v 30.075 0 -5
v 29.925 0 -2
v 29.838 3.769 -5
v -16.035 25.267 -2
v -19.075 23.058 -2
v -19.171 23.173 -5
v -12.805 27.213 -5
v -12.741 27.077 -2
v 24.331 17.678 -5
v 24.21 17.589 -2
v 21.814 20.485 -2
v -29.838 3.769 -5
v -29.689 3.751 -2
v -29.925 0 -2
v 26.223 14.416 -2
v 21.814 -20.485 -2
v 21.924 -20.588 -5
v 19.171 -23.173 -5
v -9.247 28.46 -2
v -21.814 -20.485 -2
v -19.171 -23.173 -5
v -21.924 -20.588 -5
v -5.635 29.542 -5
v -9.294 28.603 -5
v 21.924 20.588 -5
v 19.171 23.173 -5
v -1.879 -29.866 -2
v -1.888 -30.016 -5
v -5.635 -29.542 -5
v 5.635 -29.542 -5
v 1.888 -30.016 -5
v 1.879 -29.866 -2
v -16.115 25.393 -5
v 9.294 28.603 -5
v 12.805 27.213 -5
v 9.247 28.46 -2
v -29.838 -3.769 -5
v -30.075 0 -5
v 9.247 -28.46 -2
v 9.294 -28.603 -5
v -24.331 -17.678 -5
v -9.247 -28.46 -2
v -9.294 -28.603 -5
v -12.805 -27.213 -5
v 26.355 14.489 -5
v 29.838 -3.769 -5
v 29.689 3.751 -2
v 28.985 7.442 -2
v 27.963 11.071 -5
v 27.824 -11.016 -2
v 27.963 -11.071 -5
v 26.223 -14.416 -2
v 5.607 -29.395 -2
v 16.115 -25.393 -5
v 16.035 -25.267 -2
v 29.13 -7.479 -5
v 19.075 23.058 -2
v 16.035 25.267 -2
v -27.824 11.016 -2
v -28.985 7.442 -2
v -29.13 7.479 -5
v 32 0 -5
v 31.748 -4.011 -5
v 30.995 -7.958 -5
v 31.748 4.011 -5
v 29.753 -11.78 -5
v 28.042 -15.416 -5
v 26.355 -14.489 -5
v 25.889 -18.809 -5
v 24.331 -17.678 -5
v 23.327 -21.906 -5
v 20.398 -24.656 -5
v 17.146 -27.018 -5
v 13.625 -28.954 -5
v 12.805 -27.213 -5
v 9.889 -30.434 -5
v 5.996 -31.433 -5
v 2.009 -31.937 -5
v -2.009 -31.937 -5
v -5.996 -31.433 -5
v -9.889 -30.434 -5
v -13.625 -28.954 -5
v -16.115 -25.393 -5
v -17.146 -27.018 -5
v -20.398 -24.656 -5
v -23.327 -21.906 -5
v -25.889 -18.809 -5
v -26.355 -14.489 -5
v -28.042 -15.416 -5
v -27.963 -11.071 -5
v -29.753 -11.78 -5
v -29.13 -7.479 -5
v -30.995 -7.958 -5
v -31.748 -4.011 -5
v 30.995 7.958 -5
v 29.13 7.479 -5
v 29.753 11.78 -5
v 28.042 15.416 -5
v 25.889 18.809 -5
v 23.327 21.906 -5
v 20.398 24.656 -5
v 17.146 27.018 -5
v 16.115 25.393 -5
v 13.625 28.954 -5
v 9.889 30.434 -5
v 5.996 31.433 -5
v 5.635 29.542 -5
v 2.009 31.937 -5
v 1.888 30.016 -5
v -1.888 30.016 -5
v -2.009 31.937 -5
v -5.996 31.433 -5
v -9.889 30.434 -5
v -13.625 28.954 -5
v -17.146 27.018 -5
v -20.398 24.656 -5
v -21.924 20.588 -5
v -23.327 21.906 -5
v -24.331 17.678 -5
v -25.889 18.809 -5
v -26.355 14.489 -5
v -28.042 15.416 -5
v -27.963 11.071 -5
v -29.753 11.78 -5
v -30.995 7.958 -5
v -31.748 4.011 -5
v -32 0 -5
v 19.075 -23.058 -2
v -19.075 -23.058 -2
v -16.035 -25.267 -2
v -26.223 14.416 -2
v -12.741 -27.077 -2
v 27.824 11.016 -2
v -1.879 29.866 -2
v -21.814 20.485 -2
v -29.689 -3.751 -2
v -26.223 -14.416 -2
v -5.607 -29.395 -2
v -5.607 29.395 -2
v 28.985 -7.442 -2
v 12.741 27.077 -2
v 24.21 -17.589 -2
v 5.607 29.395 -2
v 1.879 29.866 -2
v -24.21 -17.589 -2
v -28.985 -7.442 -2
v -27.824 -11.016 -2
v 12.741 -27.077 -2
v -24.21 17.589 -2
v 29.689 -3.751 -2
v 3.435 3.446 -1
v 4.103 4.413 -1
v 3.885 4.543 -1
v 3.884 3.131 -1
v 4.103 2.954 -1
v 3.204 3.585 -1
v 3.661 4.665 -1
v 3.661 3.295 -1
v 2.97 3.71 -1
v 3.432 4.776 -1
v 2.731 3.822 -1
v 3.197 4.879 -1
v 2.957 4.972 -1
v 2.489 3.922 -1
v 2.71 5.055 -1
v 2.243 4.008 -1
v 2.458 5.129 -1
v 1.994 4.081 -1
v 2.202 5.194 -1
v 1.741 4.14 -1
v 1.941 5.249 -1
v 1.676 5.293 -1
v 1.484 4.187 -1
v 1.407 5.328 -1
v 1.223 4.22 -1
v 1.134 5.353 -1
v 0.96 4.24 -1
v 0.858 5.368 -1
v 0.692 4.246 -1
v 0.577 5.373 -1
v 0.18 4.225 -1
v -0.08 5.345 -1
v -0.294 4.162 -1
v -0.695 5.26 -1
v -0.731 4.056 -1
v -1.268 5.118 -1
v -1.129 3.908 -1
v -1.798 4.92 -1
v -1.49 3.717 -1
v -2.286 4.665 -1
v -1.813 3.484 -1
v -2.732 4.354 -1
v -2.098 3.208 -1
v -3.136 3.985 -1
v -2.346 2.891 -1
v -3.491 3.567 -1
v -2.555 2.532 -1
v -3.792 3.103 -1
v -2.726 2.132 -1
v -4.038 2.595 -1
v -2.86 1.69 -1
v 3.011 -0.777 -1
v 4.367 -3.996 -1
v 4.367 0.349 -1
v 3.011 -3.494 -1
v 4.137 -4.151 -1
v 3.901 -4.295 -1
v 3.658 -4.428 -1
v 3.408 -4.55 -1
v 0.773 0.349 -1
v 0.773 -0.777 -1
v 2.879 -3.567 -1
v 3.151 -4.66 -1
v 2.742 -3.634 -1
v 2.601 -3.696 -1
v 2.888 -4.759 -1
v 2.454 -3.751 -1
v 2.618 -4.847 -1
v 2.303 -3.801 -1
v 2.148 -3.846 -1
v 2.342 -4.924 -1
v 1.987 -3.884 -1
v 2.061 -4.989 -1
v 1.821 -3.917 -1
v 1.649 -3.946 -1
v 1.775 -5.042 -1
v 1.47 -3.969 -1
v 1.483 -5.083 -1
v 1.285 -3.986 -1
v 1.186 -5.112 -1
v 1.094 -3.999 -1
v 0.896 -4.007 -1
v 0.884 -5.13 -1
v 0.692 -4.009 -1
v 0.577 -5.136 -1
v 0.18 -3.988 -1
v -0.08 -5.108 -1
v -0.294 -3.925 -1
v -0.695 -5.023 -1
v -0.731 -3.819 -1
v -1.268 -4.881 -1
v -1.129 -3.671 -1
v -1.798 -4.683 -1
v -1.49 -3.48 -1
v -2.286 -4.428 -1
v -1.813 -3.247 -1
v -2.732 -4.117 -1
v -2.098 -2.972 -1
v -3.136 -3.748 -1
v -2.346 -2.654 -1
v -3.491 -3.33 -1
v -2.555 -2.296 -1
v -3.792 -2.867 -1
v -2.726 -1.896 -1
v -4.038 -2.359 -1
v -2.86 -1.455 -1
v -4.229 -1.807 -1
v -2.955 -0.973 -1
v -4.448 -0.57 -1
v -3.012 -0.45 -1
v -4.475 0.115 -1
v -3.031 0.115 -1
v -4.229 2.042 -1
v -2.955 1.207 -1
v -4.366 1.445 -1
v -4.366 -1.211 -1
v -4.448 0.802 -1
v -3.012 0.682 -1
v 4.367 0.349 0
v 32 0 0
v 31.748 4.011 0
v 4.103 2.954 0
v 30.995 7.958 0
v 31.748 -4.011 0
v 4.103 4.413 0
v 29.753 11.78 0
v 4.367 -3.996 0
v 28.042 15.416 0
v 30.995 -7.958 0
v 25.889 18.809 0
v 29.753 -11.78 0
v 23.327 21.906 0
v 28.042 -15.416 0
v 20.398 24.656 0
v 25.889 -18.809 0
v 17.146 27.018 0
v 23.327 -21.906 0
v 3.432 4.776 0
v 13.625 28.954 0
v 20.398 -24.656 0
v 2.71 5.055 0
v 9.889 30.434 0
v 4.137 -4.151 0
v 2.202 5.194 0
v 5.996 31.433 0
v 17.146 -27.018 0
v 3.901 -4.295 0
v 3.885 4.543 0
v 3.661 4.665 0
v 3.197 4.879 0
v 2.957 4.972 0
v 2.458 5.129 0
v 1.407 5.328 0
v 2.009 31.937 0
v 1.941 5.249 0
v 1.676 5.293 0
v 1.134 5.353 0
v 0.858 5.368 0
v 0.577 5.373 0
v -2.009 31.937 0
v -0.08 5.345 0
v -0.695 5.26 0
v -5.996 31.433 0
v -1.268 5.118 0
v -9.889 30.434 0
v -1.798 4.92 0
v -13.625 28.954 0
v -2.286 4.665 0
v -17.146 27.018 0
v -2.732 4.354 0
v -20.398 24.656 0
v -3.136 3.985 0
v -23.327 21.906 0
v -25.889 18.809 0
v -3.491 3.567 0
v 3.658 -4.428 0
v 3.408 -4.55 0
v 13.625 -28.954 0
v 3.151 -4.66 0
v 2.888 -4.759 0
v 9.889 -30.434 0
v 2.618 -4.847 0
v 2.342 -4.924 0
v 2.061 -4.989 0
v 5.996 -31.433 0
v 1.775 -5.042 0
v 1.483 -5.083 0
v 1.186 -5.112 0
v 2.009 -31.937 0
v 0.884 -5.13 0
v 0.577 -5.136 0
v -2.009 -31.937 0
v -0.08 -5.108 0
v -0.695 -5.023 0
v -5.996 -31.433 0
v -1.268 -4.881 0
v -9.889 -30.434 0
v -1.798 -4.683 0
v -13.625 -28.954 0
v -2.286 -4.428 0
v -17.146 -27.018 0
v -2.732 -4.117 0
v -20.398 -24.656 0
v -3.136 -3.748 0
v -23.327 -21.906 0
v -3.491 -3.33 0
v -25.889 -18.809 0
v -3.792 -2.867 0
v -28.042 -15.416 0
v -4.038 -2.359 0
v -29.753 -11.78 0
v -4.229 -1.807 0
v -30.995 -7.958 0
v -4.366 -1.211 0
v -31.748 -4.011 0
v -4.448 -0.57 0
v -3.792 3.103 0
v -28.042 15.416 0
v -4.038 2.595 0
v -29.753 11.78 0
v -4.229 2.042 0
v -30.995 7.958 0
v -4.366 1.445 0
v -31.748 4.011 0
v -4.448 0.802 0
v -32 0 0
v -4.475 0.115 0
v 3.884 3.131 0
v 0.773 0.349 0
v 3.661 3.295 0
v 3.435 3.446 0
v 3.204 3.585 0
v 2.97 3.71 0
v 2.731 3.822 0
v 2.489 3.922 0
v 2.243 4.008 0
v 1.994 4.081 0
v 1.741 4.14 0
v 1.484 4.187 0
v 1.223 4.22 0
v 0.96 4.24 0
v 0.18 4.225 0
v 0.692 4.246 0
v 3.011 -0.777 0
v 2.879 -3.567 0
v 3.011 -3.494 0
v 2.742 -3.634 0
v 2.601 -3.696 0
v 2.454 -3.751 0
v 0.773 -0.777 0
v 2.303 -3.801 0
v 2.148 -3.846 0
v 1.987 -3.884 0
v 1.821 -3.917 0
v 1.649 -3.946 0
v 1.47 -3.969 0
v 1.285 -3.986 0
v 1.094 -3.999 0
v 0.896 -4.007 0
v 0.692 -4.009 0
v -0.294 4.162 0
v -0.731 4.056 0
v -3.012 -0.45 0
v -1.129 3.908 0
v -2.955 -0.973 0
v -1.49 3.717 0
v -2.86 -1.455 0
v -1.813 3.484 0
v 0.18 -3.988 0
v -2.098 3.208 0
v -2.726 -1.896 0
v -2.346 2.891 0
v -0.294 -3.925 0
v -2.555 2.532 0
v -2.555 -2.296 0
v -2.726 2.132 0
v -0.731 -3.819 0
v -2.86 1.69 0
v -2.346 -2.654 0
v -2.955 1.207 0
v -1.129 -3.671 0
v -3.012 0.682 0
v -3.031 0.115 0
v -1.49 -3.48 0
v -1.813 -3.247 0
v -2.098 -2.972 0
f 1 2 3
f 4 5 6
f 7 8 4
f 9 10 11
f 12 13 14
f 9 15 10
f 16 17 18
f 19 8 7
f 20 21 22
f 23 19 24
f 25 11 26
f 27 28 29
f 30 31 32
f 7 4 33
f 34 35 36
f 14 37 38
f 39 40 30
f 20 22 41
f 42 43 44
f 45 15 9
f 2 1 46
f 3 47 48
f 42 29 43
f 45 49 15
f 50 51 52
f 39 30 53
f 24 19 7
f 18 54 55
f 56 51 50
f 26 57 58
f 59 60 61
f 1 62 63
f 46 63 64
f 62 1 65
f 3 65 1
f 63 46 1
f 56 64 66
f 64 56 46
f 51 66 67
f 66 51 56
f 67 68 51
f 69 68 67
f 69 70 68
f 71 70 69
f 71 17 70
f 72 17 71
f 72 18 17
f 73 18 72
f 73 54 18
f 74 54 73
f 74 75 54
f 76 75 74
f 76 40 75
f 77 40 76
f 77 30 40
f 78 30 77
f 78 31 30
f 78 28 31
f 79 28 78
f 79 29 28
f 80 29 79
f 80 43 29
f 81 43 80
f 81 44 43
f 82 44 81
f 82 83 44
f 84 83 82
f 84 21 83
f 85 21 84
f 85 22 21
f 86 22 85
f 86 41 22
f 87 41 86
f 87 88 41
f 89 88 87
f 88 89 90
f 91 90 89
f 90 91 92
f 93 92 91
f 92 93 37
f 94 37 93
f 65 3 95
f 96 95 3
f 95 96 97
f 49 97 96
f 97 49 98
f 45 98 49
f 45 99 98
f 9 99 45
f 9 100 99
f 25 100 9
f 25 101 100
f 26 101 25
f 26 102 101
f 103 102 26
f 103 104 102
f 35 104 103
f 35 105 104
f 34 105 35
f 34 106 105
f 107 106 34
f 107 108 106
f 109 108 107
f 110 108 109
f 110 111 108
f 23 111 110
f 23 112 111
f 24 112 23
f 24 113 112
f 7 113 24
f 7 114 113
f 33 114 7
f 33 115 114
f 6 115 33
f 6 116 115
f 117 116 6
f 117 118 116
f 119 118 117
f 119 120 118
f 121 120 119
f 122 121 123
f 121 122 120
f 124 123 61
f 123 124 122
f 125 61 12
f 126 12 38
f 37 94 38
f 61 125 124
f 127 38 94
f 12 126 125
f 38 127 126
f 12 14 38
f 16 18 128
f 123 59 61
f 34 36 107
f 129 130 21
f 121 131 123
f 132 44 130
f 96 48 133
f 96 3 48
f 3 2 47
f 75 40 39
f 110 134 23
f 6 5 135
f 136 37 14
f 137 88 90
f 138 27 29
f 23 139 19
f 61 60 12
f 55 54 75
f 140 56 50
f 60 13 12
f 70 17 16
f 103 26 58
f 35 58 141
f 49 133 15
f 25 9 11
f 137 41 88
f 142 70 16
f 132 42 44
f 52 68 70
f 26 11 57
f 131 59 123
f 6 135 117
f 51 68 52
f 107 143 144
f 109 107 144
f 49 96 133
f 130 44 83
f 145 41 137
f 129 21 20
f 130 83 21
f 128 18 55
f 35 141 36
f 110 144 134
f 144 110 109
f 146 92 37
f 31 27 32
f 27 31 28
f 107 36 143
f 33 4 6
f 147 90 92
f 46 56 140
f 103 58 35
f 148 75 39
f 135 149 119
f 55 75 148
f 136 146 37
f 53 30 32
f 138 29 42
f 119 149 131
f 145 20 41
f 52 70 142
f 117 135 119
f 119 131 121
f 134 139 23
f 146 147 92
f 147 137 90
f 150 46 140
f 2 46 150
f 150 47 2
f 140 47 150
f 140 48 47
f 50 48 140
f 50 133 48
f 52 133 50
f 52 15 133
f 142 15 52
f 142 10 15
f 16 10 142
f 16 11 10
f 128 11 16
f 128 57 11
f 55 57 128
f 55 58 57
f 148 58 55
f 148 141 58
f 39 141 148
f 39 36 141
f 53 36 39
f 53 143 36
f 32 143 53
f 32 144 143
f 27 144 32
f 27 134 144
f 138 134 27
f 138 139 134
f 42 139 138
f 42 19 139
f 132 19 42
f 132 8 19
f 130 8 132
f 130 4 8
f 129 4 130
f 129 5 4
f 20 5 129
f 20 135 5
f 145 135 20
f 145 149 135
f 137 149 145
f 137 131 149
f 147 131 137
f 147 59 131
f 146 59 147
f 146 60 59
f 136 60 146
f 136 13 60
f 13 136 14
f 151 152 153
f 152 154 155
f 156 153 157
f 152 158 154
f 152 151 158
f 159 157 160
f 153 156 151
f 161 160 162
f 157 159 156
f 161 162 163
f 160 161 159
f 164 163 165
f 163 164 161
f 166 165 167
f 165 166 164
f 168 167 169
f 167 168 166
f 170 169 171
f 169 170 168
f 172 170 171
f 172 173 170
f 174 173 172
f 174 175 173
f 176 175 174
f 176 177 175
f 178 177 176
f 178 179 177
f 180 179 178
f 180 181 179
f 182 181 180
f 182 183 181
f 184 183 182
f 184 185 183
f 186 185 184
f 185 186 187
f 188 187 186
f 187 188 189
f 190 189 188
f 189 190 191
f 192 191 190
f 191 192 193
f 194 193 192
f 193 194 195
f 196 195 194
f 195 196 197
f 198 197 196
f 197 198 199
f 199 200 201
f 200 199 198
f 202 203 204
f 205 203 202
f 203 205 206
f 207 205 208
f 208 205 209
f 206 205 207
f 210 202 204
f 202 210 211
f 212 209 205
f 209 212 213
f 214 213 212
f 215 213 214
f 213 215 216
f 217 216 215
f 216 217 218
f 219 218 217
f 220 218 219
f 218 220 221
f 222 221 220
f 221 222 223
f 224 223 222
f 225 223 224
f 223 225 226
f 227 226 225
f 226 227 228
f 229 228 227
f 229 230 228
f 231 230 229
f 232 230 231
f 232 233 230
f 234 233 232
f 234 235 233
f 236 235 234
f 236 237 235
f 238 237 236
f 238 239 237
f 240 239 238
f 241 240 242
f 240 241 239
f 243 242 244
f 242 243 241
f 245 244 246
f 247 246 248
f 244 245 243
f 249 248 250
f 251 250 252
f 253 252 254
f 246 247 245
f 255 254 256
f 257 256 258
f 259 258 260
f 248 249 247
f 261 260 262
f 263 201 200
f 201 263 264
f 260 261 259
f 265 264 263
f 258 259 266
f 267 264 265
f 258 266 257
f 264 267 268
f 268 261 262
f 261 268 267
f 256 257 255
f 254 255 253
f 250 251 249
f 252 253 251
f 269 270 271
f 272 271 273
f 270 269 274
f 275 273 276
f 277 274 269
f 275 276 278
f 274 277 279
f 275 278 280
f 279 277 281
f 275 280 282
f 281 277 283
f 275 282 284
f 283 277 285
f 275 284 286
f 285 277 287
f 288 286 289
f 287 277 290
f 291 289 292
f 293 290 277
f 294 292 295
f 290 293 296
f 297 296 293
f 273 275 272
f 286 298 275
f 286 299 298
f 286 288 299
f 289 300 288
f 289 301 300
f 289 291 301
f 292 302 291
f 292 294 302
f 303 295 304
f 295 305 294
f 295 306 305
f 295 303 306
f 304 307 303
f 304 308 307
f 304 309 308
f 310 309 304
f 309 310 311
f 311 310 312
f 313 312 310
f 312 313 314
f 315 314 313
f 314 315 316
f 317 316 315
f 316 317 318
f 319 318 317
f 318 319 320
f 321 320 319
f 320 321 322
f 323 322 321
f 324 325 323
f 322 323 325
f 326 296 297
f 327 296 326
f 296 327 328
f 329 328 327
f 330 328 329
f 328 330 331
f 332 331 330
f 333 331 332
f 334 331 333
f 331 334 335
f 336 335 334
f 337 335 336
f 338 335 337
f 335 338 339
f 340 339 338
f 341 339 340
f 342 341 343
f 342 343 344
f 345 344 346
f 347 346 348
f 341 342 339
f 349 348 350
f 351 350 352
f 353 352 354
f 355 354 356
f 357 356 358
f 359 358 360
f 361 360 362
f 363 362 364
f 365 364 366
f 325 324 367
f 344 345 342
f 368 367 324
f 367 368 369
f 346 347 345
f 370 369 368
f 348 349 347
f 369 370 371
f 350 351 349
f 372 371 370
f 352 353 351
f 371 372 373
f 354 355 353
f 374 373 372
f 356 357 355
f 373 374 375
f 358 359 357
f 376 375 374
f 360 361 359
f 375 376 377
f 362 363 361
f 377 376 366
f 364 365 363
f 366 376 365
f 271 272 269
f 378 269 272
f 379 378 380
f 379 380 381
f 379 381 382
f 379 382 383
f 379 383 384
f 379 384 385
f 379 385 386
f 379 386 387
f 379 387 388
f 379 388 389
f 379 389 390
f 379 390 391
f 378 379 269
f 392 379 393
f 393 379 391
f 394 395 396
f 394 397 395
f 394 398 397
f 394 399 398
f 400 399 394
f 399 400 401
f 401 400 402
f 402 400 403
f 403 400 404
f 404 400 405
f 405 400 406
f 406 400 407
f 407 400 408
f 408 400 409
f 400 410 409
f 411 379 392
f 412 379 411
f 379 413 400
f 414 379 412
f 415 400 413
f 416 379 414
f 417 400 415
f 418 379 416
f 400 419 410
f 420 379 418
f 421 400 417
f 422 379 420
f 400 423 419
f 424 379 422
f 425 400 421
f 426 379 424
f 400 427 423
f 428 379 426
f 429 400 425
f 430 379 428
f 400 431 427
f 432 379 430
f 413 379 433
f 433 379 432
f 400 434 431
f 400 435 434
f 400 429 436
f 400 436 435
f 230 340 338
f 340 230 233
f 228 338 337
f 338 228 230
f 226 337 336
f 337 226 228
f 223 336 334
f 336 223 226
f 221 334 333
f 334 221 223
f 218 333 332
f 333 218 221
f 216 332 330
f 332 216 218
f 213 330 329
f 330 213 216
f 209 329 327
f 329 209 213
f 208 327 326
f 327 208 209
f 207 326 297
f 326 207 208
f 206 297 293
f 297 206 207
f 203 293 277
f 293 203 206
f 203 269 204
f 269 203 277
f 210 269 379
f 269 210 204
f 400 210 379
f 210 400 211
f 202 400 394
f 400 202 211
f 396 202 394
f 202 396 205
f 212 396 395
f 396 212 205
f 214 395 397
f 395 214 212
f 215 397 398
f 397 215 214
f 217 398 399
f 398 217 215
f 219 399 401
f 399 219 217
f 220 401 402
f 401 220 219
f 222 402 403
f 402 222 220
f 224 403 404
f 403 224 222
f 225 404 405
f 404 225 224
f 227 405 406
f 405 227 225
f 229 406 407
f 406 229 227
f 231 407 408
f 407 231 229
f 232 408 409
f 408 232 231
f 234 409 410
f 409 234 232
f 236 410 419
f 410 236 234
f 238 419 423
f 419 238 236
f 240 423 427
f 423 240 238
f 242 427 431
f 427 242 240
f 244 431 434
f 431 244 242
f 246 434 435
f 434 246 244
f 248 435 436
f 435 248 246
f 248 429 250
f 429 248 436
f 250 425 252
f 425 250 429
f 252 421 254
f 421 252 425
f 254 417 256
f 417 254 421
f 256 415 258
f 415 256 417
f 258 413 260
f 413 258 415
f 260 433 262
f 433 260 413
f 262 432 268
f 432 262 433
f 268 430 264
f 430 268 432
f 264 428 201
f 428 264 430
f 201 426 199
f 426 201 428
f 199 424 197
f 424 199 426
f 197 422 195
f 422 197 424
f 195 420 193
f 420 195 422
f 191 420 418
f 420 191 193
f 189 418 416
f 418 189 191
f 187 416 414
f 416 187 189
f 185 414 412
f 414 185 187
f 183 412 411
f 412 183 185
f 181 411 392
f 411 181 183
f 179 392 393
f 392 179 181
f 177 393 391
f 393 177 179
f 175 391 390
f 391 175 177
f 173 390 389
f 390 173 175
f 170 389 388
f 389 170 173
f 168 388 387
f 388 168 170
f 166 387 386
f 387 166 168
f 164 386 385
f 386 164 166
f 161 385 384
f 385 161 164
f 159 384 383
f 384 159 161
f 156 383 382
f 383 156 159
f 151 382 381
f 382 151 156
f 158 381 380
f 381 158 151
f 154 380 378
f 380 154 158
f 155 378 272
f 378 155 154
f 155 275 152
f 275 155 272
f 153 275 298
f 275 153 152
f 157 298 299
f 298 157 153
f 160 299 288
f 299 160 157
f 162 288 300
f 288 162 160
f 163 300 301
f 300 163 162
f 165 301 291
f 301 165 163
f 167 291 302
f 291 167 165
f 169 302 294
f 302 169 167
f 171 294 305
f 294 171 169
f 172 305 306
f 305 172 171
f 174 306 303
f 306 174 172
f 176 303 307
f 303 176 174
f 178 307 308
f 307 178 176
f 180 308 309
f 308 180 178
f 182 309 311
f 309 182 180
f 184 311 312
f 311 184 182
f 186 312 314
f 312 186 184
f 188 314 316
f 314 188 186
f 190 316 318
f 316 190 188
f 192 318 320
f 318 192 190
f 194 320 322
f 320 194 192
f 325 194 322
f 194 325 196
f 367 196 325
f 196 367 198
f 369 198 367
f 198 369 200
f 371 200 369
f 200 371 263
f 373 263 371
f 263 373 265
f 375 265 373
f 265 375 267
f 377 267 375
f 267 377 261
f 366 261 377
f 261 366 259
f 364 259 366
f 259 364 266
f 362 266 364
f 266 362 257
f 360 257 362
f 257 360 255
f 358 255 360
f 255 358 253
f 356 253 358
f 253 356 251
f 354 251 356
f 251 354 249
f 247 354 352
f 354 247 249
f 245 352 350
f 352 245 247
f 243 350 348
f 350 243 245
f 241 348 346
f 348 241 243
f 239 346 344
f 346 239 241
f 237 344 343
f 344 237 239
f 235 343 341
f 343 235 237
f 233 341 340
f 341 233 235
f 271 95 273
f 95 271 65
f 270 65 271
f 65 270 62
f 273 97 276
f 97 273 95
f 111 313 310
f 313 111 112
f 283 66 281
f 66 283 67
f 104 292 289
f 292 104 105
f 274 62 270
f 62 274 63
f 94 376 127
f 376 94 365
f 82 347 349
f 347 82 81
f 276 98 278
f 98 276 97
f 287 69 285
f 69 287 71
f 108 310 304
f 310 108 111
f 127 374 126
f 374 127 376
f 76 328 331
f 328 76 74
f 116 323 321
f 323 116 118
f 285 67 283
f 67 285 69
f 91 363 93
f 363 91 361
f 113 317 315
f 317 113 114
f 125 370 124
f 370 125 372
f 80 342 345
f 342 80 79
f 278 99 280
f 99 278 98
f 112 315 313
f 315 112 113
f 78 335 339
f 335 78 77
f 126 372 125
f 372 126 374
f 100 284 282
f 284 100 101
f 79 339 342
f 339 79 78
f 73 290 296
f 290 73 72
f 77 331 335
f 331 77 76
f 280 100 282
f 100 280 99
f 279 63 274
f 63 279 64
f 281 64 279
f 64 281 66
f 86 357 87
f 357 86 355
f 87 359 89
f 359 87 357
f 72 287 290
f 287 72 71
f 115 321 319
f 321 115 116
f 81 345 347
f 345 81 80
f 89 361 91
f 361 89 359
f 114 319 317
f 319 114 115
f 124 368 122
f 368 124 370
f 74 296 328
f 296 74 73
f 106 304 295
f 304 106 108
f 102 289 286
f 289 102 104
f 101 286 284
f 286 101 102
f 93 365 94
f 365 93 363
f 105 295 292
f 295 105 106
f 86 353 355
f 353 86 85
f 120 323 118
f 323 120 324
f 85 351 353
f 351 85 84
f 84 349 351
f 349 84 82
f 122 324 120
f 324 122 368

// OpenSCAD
$fn = 50;


difference() {
	union() {
		translate(v = [0, 0, -5.0000000000]) {
			cylinder(h = 5, r = 32.0000000000);
		}
	}
	union() {
		#translate(v = [0, 0, -5.0000000000]) {
			cylinder(h = 3, r1 = 30.0750000000, r2 = 29.9250000000);
		}
		translate(v = [0, 0, -1]) {
			linear_extrude(height = 1) {
				text(font = "Impact", halign = "center", size = 10, text = "G", valign = "center");
			}
		}
	}
}
